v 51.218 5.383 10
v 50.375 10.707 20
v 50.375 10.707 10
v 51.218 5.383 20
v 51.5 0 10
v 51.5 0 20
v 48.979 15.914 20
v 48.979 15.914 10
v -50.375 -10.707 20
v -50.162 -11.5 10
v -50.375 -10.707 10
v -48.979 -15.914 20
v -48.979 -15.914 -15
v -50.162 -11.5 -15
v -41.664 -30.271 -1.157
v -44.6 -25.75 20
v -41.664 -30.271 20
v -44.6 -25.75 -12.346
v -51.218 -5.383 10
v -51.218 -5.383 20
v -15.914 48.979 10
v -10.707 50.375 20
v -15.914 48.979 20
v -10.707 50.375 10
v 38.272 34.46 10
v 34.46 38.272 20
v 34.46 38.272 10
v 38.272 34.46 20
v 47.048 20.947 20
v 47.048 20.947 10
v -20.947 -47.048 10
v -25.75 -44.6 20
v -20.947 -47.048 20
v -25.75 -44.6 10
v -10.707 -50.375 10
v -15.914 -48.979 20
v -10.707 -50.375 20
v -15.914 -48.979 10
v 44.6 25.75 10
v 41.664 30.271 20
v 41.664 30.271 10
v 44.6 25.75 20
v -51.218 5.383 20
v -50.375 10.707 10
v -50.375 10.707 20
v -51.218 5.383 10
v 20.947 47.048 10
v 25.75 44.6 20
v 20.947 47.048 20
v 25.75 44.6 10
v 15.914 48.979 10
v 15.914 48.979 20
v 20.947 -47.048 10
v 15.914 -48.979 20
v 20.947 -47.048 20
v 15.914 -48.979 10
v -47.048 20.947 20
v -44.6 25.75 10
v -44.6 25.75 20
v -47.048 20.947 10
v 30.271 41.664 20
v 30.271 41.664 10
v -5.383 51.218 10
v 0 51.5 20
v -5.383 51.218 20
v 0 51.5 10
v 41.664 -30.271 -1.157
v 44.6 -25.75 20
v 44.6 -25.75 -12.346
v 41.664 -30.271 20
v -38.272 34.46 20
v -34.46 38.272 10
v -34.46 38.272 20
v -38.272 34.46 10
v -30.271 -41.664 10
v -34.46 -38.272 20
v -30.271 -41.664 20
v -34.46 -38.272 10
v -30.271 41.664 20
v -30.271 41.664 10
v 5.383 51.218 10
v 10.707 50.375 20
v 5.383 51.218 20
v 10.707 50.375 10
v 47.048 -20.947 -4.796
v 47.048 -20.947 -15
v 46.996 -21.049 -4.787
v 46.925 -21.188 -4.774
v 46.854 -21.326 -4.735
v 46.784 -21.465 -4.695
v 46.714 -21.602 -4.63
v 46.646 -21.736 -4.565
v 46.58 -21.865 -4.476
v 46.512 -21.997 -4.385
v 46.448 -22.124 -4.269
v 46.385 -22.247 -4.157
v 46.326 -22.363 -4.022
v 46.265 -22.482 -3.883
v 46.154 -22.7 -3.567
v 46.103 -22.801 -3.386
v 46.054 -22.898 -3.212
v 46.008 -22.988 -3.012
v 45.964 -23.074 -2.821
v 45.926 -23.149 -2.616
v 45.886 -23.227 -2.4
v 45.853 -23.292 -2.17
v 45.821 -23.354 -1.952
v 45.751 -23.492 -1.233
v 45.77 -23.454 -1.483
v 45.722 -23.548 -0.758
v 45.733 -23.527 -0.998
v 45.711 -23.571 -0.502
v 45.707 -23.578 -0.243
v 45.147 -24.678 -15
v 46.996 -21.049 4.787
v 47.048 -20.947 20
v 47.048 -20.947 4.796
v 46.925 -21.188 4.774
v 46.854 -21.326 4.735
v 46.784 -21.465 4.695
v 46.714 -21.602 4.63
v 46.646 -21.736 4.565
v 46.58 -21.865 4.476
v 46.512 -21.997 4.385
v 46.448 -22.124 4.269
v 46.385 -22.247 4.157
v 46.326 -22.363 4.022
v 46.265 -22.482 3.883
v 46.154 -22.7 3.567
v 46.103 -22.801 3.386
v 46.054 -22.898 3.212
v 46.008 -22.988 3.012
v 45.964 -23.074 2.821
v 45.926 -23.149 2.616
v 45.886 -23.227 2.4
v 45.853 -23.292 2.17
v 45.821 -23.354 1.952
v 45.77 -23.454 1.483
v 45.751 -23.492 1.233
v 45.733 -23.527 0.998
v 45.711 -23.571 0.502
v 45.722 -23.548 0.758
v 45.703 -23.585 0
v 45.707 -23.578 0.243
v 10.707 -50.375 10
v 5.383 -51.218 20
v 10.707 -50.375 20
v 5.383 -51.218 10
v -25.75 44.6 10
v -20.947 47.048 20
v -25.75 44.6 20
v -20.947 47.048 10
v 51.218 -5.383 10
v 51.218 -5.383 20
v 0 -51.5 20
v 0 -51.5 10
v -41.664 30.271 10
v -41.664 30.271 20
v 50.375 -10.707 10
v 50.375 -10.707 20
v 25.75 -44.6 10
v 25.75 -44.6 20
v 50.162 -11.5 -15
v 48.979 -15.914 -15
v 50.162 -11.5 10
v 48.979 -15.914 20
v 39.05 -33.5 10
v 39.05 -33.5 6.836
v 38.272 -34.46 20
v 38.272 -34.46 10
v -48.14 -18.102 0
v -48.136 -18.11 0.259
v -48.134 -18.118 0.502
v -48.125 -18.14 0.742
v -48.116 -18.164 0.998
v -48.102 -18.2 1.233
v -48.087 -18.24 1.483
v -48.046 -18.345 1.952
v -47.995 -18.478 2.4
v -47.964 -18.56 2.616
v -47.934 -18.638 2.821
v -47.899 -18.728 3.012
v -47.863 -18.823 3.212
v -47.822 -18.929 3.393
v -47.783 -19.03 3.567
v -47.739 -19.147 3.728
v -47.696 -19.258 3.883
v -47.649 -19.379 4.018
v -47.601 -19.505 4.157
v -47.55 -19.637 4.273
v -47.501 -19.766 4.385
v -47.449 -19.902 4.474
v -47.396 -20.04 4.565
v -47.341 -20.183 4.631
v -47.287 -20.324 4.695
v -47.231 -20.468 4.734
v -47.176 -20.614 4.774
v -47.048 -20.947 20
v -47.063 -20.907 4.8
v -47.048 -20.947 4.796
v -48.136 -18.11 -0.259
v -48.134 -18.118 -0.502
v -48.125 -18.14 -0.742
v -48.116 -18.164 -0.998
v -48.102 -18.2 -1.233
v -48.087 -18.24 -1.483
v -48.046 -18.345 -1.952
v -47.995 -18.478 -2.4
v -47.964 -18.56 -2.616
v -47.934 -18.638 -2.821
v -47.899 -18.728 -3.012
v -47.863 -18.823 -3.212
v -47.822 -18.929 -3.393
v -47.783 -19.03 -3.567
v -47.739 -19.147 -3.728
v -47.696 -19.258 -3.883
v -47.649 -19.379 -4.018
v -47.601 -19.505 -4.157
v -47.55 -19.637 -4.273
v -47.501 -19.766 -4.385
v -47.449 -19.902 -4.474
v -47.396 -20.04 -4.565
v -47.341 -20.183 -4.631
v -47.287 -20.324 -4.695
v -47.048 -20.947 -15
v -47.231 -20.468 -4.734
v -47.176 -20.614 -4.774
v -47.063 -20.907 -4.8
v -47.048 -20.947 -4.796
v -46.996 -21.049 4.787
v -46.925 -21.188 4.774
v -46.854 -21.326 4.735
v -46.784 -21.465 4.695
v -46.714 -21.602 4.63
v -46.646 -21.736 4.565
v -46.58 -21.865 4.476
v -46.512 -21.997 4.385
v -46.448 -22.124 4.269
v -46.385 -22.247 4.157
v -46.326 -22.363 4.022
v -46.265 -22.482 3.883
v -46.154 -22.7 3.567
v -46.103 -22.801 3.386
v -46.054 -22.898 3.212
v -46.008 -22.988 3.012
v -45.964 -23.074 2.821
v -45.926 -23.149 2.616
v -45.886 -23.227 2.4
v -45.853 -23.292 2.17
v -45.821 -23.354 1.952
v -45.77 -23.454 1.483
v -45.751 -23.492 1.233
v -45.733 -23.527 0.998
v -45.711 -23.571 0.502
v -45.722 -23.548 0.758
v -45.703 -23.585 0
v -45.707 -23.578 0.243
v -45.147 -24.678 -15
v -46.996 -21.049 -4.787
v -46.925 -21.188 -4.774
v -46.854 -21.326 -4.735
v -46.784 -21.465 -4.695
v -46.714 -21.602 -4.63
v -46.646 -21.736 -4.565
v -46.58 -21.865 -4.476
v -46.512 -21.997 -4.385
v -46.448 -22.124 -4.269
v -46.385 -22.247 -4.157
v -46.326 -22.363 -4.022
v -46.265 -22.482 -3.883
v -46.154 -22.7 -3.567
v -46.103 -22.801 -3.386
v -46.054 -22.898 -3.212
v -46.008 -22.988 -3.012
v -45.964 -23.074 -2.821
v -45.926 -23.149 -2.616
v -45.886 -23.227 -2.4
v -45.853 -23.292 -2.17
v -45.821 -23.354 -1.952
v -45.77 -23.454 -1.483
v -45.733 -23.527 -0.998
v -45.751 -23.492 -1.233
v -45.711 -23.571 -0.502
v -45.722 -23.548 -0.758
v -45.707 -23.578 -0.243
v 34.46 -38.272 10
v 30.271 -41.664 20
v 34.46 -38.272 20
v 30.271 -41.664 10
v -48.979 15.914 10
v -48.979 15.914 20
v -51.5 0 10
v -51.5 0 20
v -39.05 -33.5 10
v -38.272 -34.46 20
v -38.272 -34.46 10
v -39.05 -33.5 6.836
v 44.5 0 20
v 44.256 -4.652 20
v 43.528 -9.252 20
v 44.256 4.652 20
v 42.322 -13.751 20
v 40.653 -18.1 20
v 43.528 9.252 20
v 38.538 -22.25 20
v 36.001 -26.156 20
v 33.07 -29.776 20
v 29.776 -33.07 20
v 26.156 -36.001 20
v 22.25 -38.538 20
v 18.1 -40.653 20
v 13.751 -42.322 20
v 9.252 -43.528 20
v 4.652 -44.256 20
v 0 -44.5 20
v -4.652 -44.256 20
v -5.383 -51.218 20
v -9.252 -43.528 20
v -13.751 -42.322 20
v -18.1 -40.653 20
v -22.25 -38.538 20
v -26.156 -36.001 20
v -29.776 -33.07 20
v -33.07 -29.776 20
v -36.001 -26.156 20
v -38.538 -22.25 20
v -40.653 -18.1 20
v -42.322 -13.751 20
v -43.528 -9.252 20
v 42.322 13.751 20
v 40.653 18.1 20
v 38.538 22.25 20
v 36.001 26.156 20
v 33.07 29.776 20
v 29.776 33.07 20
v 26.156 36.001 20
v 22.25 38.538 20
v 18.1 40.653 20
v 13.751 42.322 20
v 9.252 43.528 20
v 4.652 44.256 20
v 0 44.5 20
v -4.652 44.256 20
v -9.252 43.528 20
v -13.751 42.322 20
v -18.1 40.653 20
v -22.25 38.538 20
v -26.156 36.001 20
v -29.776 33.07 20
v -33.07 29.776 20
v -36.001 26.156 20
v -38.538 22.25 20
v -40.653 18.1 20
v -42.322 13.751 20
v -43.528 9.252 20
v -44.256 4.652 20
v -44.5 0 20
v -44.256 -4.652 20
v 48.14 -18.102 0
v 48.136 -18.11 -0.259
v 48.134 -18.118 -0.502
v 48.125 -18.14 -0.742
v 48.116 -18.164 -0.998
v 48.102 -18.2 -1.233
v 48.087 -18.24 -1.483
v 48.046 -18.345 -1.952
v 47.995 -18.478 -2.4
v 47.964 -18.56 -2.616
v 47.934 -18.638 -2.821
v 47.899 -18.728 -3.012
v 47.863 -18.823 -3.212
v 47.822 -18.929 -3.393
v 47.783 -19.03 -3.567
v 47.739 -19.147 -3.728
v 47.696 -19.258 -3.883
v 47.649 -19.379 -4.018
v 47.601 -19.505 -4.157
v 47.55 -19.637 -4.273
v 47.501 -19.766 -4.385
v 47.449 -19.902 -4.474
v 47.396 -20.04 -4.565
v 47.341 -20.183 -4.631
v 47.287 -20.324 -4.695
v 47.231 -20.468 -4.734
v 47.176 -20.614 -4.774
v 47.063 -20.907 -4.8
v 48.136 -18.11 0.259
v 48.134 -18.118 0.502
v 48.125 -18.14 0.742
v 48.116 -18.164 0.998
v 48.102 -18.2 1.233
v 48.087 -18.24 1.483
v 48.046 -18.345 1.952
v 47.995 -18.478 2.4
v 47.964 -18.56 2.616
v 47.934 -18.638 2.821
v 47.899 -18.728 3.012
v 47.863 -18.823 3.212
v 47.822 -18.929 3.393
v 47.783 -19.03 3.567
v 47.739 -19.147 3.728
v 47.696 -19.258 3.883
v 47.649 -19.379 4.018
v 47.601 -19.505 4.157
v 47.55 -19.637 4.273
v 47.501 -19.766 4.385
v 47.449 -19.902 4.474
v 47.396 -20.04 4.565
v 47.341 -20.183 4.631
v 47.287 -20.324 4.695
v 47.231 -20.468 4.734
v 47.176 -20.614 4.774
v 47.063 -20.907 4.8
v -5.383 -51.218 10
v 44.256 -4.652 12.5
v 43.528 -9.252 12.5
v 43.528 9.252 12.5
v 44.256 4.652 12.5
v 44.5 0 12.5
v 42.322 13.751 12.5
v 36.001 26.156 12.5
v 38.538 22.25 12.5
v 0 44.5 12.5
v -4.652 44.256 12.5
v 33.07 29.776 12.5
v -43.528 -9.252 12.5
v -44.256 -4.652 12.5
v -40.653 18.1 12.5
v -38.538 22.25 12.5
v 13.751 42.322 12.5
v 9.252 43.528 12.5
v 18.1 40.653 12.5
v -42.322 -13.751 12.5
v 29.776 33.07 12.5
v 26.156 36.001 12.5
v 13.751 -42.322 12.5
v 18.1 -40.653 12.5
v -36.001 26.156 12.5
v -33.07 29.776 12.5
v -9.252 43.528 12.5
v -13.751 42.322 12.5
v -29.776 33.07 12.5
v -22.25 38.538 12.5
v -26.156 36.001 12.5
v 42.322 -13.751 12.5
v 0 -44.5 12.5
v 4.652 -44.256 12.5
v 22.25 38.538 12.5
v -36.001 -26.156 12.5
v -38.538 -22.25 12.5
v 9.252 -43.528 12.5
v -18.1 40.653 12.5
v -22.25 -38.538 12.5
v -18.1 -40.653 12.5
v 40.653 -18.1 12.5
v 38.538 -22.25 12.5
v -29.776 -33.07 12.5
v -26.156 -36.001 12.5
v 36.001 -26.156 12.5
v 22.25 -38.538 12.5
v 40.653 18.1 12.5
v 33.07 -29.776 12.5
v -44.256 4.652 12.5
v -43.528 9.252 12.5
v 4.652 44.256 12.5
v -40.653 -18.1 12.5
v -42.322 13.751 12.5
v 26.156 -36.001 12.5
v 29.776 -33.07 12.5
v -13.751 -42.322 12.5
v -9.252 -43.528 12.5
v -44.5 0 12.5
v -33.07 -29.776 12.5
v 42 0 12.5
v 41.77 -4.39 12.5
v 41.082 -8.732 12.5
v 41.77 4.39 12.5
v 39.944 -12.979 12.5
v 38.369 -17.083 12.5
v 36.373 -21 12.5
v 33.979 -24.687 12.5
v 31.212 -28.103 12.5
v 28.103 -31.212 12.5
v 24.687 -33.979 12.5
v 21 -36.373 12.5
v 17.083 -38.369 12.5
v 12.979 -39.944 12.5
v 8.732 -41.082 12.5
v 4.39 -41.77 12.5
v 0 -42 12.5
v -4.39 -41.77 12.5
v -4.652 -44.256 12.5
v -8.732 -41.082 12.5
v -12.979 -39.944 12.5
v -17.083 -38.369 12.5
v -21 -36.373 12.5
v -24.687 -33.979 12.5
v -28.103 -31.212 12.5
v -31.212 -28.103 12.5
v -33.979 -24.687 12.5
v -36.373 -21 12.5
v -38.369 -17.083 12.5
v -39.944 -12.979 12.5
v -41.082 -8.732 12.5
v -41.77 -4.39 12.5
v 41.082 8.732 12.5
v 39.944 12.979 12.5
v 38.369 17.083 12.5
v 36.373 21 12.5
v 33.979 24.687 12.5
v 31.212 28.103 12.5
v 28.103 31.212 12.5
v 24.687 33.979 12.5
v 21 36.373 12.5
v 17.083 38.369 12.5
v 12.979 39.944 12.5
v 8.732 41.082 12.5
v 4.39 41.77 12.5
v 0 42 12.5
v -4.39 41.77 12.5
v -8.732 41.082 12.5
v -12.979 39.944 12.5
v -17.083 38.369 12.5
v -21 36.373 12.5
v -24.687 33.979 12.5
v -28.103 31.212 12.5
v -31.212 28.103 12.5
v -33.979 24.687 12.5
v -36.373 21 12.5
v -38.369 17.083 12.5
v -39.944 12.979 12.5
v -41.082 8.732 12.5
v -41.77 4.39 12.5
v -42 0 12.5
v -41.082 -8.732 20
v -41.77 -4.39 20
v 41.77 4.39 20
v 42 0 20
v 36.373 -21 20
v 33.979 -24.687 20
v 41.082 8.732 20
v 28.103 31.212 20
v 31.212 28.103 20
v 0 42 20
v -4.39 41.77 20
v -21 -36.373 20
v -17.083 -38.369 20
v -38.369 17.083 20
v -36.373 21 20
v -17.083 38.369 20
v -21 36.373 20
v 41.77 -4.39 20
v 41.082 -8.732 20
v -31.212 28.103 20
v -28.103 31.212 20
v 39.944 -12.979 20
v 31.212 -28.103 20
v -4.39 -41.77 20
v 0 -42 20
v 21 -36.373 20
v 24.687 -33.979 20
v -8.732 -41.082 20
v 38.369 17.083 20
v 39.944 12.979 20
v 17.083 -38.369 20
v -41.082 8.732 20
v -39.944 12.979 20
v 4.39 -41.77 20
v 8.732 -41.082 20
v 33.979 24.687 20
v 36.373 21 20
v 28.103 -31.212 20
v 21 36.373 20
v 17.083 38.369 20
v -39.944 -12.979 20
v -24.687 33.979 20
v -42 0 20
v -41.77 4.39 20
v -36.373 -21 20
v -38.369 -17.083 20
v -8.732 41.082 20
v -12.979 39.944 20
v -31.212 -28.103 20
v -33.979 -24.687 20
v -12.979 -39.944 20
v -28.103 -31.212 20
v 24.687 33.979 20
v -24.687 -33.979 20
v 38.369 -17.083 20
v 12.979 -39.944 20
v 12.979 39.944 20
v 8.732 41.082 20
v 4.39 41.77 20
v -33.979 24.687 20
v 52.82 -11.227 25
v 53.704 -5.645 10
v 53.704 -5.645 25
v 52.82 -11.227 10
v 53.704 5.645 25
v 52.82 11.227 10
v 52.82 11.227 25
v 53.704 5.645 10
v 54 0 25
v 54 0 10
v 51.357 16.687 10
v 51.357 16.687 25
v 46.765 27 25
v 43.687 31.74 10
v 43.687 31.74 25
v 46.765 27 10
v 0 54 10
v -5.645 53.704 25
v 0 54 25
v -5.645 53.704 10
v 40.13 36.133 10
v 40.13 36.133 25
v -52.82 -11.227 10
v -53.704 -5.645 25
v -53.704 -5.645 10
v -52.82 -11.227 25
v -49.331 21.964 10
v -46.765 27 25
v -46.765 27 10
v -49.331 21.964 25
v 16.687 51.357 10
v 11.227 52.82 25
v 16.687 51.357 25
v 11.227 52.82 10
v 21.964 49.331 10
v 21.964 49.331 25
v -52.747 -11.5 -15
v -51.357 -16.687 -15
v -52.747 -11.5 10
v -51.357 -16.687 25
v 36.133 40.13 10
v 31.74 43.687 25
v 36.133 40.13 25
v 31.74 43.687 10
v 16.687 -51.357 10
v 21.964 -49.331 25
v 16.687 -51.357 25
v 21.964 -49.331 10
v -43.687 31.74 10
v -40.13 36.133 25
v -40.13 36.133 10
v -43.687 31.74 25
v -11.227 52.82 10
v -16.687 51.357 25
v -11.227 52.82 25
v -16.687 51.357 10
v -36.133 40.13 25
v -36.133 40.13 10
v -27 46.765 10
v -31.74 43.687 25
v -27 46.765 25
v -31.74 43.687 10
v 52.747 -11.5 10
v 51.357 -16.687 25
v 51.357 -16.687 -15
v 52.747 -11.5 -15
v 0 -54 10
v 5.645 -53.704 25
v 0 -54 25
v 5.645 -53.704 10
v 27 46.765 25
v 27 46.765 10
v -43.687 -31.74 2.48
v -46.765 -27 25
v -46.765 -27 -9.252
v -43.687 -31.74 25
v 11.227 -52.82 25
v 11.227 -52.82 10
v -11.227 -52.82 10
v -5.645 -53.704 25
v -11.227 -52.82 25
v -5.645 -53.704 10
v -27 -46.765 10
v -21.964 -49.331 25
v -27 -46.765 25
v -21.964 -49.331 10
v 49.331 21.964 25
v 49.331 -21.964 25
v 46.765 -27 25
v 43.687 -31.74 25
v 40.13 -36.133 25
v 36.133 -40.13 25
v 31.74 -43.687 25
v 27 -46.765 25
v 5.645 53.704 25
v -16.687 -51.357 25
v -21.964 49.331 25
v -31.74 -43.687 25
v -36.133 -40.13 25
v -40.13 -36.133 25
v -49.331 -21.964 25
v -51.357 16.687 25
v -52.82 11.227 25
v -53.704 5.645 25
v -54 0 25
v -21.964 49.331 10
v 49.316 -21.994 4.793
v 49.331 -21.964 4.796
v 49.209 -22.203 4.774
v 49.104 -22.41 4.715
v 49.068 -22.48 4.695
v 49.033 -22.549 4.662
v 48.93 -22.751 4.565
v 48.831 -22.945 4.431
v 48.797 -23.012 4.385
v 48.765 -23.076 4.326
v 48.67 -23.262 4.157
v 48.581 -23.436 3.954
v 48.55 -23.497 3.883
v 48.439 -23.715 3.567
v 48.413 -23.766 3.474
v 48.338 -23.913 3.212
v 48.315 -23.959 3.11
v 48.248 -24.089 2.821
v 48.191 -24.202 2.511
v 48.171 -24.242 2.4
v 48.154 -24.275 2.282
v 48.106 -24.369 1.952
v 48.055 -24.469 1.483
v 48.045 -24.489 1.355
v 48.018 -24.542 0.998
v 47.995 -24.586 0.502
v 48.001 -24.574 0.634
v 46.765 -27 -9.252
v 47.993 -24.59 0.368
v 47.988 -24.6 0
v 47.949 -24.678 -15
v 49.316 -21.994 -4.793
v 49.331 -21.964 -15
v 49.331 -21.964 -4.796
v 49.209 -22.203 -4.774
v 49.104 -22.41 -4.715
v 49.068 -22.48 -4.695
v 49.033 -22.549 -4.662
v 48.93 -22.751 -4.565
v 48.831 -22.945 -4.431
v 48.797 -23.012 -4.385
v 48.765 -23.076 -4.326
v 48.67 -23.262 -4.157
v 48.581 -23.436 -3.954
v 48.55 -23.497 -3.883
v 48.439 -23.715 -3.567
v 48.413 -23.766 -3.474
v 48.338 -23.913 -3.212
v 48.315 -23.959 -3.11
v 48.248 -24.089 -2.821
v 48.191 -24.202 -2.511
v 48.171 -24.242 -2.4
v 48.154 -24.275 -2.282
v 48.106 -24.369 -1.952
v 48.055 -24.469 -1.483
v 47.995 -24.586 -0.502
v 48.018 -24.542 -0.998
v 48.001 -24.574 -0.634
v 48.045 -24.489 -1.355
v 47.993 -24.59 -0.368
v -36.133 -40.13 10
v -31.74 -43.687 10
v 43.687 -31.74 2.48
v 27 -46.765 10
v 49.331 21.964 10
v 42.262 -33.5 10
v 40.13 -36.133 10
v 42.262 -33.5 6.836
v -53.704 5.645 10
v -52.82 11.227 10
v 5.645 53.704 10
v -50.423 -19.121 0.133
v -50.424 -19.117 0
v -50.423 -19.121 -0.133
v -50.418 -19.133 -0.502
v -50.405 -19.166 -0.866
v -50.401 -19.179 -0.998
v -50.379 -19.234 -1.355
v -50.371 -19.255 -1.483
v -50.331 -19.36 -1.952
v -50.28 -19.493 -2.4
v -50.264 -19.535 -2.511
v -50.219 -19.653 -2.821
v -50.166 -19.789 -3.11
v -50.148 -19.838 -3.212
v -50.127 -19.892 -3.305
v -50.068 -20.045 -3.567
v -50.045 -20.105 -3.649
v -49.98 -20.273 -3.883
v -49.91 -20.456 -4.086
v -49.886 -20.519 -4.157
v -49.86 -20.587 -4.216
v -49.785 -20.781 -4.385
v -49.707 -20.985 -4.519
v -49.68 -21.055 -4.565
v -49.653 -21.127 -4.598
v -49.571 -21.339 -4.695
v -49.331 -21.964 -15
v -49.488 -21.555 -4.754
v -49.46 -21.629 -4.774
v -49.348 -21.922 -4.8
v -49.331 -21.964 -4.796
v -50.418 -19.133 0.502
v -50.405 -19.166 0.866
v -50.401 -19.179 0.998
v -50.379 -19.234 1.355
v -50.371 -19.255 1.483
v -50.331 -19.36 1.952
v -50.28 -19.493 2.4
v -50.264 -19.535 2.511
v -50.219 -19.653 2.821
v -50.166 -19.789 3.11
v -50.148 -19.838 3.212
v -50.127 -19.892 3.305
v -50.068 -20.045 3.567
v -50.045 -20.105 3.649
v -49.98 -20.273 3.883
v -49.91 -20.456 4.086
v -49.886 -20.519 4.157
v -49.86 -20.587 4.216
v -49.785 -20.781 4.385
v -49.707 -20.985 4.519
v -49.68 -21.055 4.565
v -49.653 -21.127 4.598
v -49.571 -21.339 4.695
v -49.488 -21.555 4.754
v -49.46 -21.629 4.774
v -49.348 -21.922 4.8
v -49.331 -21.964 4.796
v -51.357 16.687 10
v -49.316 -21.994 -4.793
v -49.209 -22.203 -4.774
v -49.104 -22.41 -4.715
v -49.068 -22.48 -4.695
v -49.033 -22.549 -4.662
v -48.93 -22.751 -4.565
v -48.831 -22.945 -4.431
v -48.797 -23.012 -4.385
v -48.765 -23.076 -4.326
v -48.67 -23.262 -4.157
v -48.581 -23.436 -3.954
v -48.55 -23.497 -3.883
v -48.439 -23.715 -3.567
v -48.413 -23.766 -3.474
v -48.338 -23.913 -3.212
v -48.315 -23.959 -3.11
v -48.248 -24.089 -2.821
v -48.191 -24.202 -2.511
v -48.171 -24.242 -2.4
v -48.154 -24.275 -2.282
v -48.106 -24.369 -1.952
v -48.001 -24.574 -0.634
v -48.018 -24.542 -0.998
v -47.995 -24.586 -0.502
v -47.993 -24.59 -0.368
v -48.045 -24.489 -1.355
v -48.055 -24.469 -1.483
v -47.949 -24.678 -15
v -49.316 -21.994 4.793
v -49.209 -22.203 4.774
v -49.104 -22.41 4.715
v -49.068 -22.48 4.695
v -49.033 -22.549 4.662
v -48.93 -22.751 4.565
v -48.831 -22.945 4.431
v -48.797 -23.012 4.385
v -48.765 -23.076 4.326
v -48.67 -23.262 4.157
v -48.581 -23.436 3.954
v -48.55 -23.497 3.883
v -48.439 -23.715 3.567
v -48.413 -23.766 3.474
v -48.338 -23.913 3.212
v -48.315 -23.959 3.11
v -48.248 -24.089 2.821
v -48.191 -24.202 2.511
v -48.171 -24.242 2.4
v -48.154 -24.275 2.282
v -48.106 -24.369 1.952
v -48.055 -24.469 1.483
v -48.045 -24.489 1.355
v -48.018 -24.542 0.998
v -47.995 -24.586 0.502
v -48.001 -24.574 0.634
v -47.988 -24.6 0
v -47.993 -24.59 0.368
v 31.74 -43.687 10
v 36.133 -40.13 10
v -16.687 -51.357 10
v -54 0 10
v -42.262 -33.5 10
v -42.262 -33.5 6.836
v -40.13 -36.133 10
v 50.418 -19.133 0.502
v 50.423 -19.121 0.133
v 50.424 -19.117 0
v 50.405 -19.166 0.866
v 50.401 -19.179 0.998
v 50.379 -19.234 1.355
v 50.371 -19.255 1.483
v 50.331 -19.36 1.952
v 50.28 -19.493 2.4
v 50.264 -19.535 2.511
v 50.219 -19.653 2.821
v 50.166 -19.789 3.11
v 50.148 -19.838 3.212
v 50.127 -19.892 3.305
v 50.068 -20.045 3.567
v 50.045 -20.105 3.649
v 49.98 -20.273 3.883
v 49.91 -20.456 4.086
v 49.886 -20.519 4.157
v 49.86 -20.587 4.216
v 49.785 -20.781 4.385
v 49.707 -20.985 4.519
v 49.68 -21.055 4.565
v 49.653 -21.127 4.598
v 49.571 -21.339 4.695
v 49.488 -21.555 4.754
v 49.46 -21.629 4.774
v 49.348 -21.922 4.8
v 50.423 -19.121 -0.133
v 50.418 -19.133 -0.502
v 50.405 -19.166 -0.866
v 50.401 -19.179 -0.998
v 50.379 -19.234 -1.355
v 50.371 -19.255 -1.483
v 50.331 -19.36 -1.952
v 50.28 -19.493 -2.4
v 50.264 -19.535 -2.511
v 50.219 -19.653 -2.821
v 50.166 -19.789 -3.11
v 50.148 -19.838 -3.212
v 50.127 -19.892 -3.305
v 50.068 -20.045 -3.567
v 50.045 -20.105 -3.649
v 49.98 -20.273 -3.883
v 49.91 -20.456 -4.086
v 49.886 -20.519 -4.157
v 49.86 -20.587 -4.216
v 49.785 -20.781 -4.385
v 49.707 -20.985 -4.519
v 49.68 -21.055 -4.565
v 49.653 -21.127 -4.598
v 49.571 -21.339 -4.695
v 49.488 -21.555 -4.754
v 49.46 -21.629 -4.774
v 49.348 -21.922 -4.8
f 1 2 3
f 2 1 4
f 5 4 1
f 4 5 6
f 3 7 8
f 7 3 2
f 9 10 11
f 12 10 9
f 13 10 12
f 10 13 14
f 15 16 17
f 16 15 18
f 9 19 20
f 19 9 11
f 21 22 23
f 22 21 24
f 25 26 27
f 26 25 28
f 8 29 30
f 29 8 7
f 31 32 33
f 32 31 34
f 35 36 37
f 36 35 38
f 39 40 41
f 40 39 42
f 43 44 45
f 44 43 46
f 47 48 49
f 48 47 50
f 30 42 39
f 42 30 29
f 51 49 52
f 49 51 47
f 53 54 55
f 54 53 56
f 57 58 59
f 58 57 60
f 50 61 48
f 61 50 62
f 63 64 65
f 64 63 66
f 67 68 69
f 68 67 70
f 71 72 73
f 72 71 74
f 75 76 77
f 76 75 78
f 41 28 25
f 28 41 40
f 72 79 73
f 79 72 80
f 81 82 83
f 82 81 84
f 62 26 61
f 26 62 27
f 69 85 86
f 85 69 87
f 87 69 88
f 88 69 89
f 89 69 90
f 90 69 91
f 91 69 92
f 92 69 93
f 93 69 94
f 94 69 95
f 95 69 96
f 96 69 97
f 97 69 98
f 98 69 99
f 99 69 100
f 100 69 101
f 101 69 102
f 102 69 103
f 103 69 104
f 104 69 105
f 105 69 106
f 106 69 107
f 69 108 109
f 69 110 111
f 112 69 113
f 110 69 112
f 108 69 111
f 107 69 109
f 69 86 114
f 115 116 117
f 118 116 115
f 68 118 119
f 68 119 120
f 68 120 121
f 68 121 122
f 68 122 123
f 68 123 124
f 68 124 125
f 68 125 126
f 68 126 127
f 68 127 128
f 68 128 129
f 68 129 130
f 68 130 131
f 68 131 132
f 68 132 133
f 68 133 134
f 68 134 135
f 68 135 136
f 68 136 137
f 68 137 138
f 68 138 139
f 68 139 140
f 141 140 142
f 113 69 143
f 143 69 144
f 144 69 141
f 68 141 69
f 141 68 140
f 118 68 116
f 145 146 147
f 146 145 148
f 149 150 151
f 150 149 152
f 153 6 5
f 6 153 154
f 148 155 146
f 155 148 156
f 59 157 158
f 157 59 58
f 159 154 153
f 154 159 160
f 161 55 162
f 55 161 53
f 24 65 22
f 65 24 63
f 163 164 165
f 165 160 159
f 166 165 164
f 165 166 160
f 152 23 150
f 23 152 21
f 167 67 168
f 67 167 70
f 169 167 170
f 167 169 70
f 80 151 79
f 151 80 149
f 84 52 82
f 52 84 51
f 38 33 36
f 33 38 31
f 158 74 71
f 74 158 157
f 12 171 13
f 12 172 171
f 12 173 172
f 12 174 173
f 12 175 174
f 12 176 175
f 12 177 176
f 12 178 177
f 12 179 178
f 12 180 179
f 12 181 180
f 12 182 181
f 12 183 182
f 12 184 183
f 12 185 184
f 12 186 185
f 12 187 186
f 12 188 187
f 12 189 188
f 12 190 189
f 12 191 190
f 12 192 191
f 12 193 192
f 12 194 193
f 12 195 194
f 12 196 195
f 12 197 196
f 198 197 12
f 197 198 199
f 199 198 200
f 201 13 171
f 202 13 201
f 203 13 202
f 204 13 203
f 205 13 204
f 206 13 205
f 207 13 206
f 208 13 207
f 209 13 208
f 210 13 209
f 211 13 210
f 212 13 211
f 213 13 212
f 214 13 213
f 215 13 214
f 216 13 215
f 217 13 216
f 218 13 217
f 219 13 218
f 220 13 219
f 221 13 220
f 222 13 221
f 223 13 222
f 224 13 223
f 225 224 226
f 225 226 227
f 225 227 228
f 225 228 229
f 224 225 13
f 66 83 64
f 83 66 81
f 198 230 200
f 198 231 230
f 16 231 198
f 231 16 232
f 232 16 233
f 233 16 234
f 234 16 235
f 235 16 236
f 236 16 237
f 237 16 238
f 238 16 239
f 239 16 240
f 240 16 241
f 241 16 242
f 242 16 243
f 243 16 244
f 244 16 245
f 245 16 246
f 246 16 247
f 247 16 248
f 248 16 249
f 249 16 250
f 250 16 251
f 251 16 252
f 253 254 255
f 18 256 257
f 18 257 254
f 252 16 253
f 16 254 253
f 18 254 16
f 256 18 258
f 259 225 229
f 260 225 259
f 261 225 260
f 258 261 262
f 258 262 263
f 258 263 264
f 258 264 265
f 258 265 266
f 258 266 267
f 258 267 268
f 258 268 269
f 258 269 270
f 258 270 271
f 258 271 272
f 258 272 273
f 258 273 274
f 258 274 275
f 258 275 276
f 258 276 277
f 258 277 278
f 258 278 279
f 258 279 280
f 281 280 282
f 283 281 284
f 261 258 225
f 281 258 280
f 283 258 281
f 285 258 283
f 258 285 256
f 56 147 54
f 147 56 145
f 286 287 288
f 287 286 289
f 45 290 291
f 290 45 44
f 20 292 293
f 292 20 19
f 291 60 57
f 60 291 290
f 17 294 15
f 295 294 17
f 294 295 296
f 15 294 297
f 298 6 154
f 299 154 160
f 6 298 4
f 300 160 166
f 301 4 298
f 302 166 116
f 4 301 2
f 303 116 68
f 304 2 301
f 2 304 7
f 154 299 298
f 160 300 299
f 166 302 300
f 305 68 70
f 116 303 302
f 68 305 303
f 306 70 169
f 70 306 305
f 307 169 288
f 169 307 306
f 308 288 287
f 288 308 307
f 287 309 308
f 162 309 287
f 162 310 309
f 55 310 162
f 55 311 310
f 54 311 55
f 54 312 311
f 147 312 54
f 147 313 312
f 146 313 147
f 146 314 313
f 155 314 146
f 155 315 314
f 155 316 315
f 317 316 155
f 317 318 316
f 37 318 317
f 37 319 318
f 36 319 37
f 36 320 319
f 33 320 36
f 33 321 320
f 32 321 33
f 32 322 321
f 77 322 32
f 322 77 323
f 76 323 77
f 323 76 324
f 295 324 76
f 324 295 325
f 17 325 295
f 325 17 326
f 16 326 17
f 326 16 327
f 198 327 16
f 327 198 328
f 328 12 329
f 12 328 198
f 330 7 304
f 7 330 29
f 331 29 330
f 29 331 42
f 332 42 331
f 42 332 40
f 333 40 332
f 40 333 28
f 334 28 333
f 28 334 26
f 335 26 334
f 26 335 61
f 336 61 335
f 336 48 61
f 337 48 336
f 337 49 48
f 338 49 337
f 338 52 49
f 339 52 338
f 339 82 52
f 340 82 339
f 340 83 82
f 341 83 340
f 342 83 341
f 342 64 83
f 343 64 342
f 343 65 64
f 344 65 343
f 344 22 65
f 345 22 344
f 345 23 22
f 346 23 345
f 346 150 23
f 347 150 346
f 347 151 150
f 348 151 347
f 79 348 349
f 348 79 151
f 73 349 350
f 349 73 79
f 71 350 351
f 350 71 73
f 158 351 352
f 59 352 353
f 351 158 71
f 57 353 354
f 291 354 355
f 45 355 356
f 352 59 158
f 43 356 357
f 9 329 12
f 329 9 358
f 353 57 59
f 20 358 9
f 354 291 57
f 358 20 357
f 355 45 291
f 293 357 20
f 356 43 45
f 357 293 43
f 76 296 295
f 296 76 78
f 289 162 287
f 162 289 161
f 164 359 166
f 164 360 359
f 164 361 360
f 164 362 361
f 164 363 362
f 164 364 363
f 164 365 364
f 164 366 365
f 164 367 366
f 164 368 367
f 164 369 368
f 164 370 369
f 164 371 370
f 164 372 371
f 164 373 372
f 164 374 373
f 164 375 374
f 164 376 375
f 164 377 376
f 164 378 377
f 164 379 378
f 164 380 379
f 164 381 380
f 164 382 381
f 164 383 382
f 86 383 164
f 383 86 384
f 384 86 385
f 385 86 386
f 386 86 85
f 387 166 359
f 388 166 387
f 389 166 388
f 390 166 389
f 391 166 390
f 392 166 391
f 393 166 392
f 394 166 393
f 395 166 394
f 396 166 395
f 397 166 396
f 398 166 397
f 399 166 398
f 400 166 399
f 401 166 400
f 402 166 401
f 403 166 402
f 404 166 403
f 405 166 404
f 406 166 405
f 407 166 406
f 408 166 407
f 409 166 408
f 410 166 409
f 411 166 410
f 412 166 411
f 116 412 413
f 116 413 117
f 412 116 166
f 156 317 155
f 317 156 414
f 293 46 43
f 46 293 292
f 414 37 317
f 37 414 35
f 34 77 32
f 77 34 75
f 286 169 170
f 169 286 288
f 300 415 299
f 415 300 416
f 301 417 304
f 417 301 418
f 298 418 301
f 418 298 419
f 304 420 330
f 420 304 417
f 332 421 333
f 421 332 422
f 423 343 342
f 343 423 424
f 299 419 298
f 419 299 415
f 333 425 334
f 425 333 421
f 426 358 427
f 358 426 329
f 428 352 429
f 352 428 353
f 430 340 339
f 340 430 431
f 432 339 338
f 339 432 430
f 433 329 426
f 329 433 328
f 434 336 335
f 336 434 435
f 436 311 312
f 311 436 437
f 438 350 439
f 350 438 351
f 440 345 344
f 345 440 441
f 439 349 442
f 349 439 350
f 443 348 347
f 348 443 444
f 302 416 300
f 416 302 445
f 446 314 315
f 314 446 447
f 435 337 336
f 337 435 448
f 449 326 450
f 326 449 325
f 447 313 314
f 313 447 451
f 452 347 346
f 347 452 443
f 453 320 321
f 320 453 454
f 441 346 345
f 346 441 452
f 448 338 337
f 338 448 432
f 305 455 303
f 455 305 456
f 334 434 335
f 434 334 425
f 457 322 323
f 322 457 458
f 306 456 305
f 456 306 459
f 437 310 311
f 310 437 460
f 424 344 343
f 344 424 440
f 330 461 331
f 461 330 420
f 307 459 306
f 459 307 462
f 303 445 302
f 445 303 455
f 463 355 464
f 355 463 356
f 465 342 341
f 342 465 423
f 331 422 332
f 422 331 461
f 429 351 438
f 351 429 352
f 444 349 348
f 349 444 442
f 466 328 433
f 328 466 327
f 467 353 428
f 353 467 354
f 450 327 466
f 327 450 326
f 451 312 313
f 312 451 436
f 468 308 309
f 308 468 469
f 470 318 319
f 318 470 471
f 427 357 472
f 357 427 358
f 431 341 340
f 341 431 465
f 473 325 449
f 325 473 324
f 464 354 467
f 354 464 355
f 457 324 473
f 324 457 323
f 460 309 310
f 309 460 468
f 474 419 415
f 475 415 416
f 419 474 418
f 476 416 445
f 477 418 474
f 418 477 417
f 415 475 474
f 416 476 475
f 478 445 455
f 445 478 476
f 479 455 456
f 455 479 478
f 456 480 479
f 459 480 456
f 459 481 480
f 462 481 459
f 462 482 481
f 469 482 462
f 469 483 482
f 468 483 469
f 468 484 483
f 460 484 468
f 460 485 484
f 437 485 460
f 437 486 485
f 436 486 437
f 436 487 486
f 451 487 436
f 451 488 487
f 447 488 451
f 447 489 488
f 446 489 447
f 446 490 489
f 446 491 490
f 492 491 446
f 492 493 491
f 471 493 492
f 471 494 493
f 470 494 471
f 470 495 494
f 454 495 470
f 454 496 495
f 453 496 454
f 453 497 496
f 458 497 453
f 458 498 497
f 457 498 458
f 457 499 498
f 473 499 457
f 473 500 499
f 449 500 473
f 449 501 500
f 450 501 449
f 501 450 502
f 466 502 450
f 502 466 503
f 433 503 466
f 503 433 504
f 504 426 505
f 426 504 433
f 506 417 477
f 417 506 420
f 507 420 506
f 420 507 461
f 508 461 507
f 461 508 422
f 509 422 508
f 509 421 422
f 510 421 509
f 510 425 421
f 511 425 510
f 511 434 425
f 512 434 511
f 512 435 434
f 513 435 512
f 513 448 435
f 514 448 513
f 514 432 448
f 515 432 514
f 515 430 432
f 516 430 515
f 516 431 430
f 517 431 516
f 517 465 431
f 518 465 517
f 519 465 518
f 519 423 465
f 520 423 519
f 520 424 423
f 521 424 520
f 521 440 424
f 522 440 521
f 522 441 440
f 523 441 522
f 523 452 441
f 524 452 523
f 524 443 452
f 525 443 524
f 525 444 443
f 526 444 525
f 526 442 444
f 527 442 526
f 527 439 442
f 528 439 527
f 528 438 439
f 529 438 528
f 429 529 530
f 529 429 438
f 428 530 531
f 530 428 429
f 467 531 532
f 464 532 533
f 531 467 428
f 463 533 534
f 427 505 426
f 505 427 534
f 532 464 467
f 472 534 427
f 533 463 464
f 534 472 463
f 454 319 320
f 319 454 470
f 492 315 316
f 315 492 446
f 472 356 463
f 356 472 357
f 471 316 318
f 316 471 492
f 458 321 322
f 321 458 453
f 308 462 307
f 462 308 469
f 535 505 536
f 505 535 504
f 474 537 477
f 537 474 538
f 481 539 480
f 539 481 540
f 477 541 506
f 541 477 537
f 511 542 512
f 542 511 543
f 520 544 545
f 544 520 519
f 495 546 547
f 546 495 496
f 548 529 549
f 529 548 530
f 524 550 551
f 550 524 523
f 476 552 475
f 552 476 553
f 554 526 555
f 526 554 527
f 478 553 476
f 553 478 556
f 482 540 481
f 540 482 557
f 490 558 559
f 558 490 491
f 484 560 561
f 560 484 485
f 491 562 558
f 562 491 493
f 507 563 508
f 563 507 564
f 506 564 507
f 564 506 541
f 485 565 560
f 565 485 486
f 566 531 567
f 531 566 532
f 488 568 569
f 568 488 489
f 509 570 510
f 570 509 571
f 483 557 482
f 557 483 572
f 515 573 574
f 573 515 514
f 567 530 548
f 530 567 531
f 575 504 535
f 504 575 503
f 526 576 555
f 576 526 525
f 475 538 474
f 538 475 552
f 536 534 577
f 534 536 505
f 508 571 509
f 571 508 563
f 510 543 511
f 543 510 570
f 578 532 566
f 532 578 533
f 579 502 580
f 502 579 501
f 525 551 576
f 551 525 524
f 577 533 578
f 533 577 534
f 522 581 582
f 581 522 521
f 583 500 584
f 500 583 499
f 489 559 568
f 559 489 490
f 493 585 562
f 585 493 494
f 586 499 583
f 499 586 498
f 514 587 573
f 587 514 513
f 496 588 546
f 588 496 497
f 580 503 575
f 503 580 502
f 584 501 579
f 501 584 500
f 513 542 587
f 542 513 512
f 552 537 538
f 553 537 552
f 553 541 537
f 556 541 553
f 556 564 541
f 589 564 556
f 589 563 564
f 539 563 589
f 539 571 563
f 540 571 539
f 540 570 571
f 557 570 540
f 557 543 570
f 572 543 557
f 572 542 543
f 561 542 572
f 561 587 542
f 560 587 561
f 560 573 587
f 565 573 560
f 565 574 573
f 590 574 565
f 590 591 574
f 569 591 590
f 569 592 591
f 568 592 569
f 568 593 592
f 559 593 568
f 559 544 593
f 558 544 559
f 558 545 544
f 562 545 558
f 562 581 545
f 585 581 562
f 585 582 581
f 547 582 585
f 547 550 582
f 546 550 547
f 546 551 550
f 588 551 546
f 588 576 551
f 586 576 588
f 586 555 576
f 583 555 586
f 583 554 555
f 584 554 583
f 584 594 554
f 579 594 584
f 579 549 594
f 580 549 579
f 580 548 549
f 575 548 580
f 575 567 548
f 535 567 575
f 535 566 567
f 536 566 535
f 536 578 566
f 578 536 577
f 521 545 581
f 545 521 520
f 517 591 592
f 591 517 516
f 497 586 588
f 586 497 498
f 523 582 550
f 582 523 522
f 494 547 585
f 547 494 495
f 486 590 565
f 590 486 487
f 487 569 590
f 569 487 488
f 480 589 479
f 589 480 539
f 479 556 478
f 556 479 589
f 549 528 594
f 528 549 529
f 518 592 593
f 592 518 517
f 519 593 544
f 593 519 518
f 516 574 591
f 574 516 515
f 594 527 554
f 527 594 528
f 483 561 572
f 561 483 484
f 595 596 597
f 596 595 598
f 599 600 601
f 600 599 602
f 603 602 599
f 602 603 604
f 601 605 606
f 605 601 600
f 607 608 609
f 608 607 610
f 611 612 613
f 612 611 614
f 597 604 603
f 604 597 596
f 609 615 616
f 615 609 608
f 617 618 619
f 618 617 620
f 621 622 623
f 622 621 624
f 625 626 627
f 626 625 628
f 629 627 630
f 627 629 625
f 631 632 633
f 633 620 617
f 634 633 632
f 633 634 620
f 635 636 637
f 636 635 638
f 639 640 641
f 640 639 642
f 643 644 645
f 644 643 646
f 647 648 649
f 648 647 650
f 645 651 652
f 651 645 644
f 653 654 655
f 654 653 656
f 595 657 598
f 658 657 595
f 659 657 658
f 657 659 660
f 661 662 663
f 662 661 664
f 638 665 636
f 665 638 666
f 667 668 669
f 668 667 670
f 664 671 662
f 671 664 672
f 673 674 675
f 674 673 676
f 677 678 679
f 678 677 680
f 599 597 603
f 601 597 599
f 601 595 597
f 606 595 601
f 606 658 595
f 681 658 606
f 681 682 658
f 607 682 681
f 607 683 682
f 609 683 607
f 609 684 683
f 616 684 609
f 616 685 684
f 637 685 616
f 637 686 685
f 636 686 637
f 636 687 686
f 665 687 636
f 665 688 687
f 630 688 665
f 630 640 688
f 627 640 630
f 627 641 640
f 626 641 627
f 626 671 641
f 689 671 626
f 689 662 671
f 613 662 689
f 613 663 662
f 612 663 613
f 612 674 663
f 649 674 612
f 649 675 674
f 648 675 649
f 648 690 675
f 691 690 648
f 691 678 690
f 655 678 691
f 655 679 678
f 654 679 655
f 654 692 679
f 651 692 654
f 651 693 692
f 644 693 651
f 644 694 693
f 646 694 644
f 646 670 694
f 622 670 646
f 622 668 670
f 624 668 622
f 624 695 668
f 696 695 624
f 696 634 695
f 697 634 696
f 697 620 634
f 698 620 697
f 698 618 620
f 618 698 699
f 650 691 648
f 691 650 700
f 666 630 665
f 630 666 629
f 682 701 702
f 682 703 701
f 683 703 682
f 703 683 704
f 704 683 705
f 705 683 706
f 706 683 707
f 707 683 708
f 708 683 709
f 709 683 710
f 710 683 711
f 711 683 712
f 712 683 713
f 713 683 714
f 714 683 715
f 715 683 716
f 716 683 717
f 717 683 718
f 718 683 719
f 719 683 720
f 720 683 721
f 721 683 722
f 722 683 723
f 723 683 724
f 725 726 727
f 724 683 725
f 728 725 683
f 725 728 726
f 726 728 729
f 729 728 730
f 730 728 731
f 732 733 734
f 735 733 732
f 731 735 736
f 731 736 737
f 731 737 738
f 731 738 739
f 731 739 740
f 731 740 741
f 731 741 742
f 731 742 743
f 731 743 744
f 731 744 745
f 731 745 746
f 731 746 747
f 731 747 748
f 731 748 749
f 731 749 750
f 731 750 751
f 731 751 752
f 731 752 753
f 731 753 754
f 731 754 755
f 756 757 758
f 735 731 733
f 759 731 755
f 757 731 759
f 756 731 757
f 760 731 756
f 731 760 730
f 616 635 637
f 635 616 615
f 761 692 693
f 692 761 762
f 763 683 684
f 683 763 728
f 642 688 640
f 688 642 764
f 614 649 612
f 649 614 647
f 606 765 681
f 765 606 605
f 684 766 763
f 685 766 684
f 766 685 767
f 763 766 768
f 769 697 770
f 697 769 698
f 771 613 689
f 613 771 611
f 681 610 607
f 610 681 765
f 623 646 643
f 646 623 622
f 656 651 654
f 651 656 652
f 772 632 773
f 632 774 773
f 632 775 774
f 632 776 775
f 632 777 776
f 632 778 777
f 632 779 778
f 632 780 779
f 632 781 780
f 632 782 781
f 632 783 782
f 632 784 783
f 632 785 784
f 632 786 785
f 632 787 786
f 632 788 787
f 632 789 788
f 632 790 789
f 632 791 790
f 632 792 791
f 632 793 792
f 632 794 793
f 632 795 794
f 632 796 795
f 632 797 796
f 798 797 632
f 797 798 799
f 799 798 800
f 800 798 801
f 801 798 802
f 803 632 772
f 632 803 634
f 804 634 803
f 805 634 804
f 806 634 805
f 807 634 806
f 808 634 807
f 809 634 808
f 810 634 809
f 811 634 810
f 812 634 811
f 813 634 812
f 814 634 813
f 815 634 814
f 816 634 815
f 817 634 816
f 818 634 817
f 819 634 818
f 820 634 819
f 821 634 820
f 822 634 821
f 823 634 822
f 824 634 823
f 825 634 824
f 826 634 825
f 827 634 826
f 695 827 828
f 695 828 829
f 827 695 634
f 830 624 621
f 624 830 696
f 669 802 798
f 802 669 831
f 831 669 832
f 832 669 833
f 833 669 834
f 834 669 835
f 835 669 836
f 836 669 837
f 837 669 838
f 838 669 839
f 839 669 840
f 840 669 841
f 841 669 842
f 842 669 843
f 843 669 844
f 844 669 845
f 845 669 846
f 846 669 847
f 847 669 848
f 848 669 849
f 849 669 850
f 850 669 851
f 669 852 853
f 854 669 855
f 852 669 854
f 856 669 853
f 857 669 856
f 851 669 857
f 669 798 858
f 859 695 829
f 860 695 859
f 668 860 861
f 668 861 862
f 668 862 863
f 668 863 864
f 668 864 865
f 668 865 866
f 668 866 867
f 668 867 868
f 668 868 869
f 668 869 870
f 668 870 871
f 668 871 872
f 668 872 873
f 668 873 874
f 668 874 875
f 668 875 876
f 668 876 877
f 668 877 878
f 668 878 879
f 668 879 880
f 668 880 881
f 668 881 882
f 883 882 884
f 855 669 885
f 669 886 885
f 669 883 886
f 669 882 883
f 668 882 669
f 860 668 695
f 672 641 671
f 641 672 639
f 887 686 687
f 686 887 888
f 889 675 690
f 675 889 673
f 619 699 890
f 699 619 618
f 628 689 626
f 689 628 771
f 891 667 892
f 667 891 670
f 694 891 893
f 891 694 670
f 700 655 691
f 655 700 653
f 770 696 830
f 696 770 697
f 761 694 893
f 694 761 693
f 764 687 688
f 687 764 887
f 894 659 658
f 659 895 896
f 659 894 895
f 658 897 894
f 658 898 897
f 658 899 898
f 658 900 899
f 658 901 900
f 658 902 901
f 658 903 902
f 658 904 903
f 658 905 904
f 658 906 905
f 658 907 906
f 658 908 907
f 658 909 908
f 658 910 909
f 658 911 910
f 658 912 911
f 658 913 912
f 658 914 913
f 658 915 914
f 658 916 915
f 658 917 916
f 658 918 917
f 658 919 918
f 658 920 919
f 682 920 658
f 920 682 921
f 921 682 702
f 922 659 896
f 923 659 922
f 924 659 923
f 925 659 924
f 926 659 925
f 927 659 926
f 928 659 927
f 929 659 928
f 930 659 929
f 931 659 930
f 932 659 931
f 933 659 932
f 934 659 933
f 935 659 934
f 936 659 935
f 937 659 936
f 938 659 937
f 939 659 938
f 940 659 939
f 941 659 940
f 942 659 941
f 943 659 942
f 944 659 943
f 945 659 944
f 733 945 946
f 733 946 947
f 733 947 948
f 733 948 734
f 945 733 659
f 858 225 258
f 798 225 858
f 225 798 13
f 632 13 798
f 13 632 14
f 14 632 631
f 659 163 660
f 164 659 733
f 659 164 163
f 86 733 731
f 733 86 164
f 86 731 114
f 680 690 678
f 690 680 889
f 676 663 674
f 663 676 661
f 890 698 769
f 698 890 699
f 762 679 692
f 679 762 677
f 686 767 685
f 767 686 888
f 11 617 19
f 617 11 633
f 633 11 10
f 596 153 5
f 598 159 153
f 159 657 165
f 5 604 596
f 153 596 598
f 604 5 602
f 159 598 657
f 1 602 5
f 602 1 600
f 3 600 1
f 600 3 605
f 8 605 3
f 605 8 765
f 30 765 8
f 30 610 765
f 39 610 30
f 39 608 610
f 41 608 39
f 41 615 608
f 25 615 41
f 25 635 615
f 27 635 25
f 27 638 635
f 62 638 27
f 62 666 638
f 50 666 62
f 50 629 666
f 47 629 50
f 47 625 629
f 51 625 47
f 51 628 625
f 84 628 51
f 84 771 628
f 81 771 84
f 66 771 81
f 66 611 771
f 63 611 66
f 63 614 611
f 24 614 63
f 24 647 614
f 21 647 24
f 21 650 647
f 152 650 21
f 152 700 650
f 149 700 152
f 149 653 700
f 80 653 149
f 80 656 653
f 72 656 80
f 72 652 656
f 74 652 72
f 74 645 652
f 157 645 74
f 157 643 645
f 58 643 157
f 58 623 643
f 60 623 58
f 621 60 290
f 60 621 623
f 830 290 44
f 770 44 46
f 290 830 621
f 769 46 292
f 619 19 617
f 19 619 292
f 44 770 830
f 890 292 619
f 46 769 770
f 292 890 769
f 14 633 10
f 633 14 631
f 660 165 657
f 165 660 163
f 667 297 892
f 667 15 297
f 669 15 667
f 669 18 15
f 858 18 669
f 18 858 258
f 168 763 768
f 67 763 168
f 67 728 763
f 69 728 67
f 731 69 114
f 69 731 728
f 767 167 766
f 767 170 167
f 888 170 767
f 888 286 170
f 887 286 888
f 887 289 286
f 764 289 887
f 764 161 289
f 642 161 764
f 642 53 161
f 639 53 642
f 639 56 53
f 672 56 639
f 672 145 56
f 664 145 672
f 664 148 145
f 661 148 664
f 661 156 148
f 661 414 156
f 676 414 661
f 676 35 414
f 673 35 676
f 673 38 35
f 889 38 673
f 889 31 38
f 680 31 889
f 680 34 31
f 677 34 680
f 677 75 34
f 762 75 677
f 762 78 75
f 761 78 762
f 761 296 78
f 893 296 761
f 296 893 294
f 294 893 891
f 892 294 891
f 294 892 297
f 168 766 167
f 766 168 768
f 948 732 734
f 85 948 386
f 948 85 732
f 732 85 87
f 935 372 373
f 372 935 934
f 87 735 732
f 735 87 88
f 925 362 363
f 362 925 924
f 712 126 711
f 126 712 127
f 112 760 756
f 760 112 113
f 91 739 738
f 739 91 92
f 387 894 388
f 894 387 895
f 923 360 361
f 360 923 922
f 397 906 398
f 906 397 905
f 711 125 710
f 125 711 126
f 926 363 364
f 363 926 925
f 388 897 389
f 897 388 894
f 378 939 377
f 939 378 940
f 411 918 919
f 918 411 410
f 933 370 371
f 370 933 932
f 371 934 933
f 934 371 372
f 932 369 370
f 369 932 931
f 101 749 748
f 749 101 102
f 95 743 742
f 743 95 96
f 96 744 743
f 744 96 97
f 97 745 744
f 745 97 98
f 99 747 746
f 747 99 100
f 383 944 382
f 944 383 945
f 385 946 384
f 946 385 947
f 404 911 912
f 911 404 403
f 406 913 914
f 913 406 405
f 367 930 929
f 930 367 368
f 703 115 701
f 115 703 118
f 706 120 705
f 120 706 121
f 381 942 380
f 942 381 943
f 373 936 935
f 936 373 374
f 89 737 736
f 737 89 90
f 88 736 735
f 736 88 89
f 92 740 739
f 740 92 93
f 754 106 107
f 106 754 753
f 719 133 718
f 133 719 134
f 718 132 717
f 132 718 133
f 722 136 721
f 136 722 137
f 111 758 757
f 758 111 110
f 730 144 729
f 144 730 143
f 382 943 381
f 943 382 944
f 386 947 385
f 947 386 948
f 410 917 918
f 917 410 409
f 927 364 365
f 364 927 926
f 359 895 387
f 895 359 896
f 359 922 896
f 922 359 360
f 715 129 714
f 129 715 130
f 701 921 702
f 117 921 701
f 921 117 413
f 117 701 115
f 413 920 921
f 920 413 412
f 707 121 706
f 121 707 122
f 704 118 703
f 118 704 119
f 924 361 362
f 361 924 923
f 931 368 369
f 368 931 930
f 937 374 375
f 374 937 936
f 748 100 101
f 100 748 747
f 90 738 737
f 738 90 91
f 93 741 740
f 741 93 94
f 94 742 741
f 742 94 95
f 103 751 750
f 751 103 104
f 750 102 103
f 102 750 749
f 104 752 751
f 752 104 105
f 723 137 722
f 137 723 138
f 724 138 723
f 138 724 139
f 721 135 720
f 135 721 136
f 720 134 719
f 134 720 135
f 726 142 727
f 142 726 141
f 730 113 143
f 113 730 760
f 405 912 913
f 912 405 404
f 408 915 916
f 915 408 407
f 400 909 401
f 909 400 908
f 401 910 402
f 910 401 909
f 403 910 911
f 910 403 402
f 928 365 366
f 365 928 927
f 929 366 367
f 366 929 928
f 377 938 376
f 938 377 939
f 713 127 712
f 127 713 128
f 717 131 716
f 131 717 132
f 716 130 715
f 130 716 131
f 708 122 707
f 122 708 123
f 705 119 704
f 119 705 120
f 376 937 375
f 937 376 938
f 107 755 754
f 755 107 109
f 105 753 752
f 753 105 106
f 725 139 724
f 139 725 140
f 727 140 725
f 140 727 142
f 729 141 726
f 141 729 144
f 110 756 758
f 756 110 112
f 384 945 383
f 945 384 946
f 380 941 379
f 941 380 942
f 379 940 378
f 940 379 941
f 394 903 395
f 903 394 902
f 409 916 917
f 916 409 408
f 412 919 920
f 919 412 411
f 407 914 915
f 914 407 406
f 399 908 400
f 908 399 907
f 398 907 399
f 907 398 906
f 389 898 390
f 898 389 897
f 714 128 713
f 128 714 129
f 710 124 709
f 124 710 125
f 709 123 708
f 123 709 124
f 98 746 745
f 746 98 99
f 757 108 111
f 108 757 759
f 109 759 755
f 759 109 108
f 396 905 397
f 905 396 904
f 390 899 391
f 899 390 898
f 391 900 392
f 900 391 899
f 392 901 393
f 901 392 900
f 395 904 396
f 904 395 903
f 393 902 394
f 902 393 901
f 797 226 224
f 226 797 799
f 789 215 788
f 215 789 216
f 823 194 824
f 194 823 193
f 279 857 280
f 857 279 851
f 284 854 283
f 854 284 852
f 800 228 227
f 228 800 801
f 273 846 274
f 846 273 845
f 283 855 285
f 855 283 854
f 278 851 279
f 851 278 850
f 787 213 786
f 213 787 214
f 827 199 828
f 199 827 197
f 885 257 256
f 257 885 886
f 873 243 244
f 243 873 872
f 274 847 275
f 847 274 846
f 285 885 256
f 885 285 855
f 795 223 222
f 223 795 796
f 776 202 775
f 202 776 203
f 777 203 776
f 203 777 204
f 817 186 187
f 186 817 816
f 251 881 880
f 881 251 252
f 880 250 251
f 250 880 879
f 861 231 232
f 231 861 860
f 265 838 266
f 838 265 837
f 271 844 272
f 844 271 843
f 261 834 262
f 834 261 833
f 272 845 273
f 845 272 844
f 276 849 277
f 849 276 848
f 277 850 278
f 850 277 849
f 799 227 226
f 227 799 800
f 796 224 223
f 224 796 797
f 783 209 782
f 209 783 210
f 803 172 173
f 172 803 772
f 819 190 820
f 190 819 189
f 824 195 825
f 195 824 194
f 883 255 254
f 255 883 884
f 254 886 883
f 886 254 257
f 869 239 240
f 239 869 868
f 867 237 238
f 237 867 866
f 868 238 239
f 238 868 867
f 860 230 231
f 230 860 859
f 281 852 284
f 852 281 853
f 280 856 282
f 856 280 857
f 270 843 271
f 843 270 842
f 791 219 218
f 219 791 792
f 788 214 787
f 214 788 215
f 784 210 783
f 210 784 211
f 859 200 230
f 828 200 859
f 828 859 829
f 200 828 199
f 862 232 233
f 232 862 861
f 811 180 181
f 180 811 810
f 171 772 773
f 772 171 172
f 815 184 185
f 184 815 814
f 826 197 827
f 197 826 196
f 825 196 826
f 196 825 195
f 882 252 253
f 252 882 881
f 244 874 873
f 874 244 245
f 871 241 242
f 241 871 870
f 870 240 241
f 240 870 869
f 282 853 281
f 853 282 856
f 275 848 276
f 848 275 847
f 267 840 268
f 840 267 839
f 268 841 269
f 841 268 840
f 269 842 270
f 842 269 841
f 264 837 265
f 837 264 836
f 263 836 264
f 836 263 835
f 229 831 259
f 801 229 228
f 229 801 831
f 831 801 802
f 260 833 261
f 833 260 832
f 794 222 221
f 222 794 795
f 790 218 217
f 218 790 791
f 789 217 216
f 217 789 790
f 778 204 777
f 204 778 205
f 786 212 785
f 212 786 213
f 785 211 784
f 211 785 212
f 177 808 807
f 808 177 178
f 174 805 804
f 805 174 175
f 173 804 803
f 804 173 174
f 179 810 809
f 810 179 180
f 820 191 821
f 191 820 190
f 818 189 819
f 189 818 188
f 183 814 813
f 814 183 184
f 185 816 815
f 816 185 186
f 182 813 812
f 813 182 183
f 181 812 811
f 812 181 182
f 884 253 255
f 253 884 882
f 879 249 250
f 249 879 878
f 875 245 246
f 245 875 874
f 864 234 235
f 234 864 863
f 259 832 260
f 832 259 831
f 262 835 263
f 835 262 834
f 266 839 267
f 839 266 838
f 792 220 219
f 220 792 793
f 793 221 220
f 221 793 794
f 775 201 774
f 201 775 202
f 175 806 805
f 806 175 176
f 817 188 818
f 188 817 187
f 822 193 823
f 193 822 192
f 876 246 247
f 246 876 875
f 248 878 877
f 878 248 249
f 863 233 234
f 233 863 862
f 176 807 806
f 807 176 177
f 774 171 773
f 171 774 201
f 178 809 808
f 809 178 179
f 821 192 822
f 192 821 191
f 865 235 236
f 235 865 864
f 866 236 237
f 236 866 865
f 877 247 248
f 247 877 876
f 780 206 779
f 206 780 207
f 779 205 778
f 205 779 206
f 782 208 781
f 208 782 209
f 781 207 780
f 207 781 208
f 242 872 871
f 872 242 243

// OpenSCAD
$fn = 60;

pipeOSD = 103;
pipeISD = 89;

capHeigth = 40;

//translate([0,-55,15]) cube([10,10,20],center=true);


difference(){
	translate([0,0,5]) cylinder(h=capHeigth,d=pipeOSD+5,center=true);
	color("RED")  pipeCuout();
	translate([0,40,-10]) cube([pipeOSD+10,pipeOSD,capHeigth],center=true);
	rotate([22,0,0]) translate([0,-80,0]) cube([pipeOSD+10,pipeOSD,capHeigth],center=true);
	translate([0,-85,-10]) cube([pipeOSD+10,pipeOSD,capHeigth],center=true);
	
	mirror([1,.65,0]) translate([0,-pipeOSD/2,0])	zipTieHole();
	mirror([1,-.65,0]) translate([0,-pipeOSD/2,0])	zipTieHole();
}

module pipeCuout(){
	difference(){
		cylinder(h=40, d=pipeOSD, center=true);
		translate([0,0,30]) cylinder(h=35, d=pipeISD, center=true);
	}
	cylinder(h=40, d=pipeISD -5, center=true);
}

module zipTieHole(){
	
	rotate([90,90,0]) scale([1.6,1,1]) cylinder(h=10, d=6, center=true);
	
}
